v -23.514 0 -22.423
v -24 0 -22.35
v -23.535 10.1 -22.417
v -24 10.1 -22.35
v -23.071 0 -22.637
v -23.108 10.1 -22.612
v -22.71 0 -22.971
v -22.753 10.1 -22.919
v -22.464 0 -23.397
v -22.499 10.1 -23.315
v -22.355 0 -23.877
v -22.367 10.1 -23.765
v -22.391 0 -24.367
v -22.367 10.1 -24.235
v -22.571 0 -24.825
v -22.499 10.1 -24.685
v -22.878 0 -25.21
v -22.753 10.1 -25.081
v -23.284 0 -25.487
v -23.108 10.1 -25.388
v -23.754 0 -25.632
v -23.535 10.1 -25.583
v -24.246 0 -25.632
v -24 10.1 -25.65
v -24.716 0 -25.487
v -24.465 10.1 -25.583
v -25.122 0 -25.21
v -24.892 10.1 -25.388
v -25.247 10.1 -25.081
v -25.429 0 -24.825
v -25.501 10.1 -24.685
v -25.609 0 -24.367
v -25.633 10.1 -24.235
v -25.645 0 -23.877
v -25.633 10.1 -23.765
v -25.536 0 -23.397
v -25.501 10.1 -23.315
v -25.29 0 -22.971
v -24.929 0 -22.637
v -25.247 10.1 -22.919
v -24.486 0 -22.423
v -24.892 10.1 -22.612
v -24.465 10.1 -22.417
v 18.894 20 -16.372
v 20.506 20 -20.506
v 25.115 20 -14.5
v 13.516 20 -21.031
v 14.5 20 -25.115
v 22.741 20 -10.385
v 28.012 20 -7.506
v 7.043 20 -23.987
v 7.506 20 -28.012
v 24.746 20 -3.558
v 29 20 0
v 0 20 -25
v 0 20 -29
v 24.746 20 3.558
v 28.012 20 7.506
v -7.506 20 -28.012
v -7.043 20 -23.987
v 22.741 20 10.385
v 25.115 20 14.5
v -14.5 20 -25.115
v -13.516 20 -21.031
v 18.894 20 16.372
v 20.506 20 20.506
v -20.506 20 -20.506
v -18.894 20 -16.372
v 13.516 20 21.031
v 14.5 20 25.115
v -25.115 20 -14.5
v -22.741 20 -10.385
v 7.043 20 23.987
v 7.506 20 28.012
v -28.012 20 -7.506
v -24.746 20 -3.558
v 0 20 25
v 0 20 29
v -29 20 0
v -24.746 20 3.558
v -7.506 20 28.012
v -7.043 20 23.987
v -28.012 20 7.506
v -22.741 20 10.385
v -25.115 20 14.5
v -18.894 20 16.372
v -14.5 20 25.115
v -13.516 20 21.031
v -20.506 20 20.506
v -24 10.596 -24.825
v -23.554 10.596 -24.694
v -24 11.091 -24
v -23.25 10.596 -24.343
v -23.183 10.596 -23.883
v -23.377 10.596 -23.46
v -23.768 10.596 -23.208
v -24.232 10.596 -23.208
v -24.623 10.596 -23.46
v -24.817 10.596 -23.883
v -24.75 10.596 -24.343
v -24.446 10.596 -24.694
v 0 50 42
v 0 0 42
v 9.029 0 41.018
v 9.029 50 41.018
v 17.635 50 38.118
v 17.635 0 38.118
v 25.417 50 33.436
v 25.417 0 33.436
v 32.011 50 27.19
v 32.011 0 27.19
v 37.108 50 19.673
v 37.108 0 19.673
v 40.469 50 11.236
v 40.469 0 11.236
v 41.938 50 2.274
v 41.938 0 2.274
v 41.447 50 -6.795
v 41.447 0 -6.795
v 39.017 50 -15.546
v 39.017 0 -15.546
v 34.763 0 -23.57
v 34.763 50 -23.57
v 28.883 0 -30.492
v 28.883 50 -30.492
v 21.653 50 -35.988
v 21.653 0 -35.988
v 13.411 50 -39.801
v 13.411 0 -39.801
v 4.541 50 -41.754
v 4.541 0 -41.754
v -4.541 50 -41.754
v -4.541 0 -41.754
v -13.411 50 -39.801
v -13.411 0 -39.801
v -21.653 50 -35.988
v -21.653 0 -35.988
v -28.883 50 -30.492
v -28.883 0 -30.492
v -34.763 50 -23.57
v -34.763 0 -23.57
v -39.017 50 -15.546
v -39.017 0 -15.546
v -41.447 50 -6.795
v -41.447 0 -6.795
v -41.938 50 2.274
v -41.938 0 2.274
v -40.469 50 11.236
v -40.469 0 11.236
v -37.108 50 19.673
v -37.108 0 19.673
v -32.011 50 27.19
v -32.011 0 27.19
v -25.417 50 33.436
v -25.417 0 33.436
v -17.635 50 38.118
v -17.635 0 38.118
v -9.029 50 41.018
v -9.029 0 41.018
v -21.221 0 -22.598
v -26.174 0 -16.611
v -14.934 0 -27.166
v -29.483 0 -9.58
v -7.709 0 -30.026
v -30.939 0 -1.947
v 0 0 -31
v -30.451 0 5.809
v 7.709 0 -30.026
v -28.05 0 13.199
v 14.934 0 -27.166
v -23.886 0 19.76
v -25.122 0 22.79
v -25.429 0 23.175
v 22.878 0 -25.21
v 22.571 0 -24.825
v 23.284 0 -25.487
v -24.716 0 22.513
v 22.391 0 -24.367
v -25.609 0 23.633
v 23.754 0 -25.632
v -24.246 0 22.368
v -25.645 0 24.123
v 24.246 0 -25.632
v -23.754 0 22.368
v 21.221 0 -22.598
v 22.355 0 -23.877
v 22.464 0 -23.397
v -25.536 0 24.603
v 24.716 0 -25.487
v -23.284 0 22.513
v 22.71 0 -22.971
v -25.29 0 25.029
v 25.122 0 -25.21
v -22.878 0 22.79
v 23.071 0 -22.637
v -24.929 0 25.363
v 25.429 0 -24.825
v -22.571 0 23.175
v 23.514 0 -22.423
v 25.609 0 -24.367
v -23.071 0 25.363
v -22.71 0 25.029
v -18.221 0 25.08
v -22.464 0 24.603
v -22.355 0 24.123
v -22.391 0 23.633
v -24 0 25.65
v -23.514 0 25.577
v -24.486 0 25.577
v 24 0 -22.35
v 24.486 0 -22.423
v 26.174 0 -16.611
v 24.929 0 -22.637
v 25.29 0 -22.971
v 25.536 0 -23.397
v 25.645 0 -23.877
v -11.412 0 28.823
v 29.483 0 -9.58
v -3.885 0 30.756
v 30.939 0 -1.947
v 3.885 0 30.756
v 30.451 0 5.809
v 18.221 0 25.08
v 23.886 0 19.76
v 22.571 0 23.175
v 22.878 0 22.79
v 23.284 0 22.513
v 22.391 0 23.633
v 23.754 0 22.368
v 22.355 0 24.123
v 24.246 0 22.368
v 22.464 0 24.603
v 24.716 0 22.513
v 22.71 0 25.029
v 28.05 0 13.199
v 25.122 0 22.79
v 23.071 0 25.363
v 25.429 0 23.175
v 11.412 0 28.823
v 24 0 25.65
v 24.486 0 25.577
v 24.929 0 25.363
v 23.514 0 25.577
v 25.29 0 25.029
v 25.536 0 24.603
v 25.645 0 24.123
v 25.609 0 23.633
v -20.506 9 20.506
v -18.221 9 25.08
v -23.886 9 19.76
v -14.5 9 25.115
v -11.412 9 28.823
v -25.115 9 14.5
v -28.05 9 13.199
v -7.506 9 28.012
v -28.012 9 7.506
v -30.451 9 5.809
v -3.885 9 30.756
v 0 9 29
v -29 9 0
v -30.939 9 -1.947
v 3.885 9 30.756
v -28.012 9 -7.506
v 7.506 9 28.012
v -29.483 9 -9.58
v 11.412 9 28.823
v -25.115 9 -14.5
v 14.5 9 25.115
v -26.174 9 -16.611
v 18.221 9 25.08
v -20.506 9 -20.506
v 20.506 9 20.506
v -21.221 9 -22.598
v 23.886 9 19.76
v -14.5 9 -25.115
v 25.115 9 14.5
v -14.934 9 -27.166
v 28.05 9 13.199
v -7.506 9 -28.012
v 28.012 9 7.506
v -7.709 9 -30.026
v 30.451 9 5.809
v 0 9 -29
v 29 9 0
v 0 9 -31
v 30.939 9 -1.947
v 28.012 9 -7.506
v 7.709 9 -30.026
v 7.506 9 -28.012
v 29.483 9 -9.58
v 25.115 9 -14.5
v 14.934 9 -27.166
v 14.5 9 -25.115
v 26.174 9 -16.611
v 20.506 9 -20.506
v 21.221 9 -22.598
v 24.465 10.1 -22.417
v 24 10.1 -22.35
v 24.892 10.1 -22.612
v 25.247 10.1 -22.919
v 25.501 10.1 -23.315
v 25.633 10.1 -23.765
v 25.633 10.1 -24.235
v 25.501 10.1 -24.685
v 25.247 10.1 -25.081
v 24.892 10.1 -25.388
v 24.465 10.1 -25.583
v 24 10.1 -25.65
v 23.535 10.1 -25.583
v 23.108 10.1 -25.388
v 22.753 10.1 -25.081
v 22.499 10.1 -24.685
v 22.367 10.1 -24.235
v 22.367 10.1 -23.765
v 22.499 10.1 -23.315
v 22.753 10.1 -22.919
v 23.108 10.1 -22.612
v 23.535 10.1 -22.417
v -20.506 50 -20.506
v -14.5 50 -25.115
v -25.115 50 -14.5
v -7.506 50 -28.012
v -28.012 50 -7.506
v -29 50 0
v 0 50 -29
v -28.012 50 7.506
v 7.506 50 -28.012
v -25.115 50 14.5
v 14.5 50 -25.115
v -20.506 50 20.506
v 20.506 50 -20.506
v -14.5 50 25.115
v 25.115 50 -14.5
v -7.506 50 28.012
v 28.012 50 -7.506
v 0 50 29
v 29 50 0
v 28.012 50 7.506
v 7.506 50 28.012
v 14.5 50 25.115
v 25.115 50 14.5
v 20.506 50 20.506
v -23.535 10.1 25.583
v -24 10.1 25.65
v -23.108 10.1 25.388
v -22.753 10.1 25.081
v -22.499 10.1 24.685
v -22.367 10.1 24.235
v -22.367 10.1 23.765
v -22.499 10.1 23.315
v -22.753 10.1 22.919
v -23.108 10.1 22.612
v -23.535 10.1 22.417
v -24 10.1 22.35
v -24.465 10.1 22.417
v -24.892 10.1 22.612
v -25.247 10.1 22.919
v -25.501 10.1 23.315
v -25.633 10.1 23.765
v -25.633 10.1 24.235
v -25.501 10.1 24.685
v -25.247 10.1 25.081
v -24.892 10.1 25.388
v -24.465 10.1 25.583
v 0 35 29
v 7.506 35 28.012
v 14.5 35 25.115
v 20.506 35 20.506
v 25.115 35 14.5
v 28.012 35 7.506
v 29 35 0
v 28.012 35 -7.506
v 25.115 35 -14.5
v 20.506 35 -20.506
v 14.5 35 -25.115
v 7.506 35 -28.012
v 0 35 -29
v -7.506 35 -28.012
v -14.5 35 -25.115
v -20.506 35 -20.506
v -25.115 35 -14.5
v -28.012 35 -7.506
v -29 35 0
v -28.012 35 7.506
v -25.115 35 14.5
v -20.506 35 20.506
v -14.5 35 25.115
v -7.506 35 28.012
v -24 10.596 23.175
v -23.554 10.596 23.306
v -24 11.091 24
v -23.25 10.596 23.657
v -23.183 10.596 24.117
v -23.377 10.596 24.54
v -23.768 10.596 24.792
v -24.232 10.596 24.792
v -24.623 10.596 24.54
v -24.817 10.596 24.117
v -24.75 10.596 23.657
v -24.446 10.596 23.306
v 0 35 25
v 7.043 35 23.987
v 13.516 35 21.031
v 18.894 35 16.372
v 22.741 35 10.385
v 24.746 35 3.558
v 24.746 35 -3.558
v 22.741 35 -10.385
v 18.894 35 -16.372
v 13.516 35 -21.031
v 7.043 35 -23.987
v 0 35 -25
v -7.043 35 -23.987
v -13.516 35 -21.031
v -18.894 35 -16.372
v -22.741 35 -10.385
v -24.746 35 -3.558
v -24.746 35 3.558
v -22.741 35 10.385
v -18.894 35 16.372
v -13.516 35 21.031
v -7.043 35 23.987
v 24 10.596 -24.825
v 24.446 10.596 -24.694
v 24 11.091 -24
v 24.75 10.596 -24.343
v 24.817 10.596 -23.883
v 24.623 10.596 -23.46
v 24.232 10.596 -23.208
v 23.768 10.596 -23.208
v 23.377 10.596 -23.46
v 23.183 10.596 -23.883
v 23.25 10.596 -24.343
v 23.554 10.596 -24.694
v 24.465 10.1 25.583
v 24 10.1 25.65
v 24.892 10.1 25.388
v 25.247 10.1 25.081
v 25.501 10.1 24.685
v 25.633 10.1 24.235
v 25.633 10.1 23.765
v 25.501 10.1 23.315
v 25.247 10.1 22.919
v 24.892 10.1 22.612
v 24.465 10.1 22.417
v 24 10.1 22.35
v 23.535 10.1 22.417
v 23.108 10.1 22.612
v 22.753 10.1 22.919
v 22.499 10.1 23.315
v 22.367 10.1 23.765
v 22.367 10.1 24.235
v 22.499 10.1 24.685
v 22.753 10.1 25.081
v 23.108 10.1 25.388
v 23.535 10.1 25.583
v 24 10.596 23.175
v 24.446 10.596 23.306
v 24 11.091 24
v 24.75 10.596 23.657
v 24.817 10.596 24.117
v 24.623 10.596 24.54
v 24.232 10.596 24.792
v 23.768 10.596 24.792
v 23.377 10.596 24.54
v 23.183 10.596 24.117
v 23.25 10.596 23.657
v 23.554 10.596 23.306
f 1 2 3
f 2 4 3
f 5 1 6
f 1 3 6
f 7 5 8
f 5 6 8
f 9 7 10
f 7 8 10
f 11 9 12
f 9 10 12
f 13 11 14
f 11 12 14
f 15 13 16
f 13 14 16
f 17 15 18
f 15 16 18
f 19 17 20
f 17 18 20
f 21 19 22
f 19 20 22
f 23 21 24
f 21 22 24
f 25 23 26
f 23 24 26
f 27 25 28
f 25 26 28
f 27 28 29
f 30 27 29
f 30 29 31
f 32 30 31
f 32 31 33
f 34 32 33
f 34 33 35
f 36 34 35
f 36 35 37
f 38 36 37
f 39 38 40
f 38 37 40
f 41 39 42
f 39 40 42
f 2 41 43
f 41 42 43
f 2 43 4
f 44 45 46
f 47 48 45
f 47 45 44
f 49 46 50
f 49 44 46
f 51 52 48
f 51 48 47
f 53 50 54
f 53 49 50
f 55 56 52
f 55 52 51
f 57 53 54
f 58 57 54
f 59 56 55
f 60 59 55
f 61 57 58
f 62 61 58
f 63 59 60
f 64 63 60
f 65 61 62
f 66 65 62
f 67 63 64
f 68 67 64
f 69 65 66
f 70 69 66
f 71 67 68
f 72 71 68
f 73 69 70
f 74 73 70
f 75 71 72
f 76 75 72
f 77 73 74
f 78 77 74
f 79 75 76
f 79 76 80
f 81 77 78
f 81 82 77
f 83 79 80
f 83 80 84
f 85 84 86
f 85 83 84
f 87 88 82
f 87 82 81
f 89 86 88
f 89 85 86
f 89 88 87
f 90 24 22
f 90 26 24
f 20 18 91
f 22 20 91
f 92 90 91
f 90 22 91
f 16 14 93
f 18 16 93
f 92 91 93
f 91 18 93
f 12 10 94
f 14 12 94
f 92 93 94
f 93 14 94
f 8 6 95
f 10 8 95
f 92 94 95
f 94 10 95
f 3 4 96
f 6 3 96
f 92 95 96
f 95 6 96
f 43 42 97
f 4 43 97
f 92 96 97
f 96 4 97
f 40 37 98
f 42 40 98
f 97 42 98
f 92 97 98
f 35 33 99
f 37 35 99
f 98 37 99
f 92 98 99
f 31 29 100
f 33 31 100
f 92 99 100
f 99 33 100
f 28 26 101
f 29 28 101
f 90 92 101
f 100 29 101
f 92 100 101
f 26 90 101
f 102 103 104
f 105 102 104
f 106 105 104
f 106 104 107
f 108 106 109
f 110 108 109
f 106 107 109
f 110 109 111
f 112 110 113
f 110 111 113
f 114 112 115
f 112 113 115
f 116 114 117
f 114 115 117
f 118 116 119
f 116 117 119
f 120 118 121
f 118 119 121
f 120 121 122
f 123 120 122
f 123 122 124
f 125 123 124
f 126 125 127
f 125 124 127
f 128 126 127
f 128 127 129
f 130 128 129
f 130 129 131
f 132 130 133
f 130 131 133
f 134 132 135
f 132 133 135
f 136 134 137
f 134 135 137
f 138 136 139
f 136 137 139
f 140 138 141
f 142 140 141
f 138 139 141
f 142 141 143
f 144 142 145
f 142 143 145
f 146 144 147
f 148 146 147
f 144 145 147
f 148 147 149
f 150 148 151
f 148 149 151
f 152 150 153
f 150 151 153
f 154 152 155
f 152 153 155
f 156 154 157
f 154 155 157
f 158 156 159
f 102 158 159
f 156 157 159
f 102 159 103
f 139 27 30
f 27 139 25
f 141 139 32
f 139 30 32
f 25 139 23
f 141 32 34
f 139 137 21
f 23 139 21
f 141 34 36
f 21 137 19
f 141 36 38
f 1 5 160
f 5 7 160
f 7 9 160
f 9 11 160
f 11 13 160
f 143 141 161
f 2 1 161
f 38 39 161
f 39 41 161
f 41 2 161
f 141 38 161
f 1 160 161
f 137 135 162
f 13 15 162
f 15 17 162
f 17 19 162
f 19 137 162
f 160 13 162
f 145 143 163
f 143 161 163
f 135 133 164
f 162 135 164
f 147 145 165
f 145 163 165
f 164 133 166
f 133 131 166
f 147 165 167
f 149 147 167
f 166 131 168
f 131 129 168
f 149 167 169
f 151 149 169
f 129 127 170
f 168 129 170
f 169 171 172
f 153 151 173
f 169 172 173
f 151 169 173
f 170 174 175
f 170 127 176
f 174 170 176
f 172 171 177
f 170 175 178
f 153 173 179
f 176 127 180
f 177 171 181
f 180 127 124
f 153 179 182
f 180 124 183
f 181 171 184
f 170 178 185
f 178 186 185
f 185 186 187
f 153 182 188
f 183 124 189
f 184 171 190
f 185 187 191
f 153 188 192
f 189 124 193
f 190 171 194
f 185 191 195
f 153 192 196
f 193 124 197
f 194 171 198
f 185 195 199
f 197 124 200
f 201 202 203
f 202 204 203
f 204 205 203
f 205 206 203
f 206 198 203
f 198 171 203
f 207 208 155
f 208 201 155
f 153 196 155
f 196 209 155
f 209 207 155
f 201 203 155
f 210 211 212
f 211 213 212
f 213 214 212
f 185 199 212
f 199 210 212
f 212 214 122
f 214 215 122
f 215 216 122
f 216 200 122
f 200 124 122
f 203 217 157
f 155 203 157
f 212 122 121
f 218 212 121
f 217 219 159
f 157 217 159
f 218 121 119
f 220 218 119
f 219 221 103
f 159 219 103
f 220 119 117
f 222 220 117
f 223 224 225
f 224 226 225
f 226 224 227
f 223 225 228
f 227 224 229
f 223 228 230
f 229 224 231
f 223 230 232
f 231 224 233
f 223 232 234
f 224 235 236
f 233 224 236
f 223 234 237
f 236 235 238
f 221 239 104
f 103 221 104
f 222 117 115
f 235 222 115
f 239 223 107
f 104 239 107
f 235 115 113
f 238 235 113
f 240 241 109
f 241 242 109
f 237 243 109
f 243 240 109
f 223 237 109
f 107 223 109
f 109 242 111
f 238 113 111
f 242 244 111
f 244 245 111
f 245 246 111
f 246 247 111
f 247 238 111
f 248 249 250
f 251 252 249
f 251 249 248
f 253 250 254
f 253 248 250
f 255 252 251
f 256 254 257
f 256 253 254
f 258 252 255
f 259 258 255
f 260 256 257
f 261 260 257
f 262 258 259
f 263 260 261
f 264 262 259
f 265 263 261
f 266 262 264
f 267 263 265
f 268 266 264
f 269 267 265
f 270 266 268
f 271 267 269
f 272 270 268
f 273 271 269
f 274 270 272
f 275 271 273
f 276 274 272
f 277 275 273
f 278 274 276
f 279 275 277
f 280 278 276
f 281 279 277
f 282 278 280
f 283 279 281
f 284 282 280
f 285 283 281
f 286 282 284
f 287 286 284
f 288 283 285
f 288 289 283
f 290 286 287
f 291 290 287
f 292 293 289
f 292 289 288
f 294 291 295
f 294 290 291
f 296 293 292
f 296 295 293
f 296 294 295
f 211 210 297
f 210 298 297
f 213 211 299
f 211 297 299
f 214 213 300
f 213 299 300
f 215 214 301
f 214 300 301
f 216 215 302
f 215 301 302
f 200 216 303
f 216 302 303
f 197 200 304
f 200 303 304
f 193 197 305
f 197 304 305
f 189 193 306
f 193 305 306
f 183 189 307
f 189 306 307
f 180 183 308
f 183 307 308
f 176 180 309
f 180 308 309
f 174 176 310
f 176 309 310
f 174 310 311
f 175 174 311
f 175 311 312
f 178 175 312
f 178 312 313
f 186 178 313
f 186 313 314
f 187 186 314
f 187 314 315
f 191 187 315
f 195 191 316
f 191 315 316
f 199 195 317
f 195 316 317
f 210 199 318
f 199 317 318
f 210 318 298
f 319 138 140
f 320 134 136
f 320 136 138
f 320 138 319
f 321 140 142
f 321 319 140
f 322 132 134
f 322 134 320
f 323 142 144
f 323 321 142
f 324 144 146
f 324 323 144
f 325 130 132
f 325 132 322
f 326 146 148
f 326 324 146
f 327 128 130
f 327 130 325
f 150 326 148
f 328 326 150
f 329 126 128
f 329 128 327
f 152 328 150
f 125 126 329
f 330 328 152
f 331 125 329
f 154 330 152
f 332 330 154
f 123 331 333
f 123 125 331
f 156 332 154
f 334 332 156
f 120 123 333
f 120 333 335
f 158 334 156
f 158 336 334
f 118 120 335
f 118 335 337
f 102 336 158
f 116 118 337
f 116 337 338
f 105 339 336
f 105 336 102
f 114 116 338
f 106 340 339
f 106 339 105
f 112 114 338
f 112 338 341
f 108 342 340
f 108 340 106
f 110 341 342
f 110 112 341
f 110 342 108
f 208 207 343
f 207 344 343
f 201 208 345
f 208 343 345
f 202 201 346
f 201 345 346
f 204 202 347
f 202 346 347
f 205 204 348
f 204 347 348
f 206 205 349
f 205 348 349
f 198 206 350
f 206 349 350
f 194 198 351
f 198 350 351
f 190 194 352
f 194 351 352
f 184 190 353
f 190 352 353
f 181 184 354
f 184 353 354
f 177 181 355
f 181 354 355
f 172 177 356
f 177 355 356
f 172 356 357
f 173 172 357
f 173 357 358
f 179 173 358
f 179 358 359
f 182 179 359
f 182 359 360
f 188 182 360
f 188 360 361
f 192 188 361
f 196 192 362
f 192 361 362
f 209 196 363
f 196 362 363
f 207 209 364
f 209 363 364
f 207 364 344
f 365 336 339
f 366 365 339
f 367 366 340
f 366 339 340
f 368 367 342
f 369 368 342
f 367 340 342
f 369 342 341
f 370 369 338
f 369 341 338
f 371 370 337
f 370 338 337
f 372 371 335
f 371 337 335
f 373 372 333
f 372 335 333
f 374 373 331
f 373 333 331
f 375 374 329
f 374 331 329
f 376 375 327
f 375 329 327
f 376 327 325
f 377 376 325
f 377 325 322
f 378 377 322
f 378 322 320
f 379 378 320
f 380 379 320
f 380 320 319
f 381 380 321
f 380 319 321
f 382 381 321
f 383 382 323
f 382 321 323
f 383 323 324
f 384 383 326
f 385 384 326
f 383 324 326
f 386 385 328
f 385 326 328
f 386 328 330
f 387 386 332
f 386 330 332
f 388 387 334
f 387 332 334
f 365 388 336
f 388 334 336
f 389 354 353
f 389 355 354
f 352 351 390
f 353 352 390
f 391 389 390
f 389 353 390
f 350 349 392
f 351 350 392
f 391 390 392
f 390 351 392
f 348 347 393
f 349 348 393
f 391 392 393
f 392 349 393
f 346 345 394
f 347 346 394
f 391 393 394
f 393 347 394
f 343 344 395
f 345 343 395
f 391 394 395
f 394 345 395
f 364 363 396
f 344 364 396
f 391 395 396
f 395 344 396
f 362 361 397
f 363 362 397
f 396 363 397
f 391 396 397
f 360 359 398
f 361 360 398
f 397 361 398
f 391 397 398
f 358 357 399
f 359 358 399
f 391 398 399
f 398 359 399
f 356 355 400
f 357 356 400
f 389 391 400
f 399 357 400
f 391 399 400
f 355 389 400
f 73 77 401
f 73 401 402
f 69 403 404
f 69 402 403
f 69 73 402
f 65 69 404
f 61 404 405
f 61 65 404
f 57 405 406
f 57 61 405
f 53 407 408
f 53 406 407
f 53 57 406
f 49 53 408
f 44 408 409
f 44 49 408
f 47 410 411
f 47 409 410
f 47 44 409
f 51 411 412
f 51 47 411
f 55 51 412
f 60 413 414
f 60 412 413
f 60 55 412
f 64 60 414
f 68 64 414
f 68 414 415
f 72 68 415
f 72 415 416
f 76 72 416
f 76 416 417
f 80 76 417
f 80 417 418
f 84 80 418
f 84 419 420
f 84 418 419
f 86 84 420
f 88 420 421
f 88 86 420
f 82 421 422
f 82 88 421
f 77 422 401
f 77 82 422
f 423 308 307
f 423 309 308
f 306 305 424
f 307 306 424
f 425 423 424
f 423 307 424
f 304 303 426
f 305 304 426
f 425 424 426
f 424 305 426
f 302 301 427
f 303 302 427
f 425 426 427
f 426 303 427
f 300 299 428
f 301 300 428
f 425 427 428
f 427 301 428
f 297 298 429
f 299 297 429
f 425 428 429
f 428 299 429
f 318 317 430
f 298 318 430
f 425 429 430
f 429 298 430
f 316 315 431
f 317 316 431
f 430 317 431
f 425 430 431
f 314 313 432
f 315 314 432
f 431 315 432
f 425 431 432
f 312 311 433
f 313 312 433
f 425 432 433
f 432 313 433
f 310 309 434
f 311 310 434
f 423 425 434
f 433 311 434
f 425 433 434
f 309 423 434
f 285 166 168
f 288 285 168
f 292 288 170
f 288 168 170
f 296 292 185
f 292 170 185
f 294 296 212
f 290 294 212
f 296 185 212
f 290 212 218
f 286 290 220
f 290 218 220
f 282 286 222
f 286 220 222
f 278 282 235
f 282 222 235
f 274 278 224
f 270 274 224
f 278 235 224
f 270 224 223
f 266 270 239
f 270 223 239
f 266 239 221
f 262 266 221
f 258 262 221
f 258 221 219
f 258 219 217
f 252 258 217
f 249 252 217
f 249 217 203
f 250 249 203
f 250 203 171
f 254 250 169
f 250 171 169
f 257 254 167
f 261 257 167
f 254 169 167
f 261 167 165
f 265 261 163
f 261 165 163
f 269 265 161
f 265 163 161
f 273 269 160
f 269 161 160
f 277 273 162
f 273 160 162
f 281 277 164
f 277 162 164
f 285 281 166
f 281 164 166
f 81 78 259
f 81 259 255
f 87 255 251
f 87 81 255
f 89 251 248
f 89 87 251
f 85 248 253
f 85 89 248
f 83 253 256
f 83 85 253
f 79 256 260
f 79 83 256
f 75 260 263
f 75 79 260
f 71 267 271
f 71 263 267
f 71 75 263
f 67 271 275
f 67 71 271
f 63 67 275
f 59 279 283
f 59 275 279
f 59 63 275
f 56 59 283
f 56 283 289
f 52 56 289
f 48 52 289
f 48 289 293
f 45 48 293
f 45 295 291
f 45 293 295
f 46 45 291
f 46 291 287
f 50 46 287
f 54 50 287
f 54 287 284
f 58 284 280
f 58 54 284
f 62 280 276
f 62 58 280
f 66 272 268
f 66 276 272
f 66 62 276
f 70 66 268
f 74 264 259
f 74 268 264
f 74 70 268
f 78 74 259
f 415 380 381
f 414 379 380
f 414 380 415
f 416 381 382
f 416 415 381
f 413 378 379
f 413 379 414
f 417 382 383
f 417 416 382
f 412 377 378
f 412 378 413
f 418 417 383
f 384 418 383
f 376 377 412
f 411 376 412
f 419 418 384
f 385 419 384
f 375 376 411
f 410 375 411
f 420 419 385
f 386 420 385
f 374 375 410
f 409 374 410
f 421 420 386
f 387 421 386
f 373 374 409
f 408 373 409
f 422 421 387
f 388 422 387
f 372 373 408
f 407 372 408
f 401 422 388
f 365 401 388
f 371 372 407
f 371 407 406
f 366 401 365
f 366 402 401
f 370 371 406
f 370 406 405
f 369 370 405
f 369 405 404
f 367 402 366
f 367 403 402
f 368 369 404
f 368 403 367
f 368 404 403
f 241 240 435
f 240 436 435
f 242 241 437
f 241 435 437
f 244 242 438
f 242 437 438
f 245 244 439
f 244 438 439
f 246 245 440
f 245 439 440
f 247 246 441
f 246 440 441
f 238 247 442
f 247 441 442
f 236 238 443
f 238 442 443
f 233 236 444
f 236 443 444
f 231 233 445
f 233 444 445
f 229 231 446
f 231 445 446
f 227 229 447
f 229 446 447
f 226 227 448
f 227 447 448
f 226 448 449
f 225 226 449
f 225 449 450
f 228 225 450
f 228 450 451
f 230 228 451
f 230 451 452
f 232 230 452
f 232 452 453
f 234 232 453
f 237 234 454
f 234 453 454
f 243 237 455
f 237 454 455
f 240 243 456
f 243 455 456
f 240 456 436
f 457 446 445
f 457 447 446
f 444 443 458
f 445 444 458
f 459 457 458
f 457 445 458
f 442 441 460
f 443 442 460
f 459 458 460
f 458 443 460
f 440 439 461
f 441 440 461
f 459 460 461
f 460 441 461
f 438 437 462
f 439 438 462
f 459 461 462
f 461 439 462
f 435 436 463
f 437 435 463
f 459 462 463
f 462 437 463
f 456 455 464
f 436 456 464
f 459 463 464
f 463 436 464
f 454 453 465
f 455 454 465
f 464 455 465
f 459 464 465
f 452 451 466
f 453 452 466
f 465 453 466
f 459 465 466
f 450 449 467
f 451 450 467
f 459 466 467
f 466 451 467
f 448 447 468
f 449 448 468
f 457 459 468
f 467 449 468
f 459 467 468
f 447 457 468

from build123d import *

# Parameters (mm, degrees)
SKETCH1_R             = 42
SKETCH1_R_2           = 25
EXTRUDE1_DEPTH        = 50
SKETCH3_R             = 29
EXTRUDE3_DEPTH        = 15
EXTRUDE4_START        = -20
SKETCH4_R             = 29
EXTRUDE4_DEPTH        = 20
SKETCH5_R             = 31
EXTRUDE5_DEPTH        = 9
M4_TAPPED_HOLE1_D     = 3.3
M4_TAPPED_HOLE1_DEPTH = 10.1
M4_TAPPED_HOLE1_TIP   = 0.991420021


with BuildPart() as part:
    # Sketch1 → Extrude1 (new body)
    with BuildSketch(Plane(origin=(0, 0, 0), x_dir=(1, 0, 0), z_dir=(0, 1, 0))):
        with Locations(Location((0, 0, 0), (0, 0, 270))):
            Circle(SKETCH1_R)
        with Locations(Location((0, 0, 0), (0, 0, 270))):
            Circle(SKETCH1_R_2, mode=Mode.SUBTRACT)
    extrude(amount=EXTRUDE1_DEPTH)

    # Sketch3 → Extrude3 (cut)
    with BuildSketch(Plane(origin=(0, 50, 0), x_dir=(1, 0, 0), z_dir=(0, 1, 0))):
        with Locations(Location((0, 0, 0), (0, 0, 270))):
            Circle(SKETCH3_R)
    extrude(amount=-EXTRUDE3_DEPTH, mode=Mode.SUBTRACT)

    # Sketch4 → Extrude4 (cut)
    with BuildSketch(Plane.XZ.offset(EXTRUDE4_START)):
        with Locations(Location((0, 0, 0), (0, 0, 90))):
            Circle(SKETCH4_R)
    extrude(amount=EXTRUDE4_DEPTH, mode=Mode.SUBTRACT)

    # Sketch5 → Extrude5 (cut)
    with BuildSketch(Plane.XZ):
        with Locations(Location((0, 0, 0), (0, 0, 270))):
            Circle(SKETCH5_R)
    extrude(amount=-EXTRUDE5_DEPTH, mode=Mode.SUBTRACT)

    # M4 Tapped Hole1
    with Locations(Plane(origin=(-24, 0, 24), x_dir=(0, 0, -1), z_dir=(0, -1, 0))):
        with Locations((0, 0), (0, 48), (48, 0), (48, 48)):
            Hole(M4_TAPPED_HOLE1_D / 2, depth=M4_TAPPED_HOLE1_DEPTH)
            with Locations((0, 0, -(M4_TAPPED_HOLE1_DEPTH + M4_TAPPED_HOLE1_TIP / 2))):  # 118° drill point
                Cone(0, M4_TAPPED_HOLE1_D / 2, M4_TAPPED_HOLE1_TIP, mode=Mode.SUBTRACT)


solid = part.part
